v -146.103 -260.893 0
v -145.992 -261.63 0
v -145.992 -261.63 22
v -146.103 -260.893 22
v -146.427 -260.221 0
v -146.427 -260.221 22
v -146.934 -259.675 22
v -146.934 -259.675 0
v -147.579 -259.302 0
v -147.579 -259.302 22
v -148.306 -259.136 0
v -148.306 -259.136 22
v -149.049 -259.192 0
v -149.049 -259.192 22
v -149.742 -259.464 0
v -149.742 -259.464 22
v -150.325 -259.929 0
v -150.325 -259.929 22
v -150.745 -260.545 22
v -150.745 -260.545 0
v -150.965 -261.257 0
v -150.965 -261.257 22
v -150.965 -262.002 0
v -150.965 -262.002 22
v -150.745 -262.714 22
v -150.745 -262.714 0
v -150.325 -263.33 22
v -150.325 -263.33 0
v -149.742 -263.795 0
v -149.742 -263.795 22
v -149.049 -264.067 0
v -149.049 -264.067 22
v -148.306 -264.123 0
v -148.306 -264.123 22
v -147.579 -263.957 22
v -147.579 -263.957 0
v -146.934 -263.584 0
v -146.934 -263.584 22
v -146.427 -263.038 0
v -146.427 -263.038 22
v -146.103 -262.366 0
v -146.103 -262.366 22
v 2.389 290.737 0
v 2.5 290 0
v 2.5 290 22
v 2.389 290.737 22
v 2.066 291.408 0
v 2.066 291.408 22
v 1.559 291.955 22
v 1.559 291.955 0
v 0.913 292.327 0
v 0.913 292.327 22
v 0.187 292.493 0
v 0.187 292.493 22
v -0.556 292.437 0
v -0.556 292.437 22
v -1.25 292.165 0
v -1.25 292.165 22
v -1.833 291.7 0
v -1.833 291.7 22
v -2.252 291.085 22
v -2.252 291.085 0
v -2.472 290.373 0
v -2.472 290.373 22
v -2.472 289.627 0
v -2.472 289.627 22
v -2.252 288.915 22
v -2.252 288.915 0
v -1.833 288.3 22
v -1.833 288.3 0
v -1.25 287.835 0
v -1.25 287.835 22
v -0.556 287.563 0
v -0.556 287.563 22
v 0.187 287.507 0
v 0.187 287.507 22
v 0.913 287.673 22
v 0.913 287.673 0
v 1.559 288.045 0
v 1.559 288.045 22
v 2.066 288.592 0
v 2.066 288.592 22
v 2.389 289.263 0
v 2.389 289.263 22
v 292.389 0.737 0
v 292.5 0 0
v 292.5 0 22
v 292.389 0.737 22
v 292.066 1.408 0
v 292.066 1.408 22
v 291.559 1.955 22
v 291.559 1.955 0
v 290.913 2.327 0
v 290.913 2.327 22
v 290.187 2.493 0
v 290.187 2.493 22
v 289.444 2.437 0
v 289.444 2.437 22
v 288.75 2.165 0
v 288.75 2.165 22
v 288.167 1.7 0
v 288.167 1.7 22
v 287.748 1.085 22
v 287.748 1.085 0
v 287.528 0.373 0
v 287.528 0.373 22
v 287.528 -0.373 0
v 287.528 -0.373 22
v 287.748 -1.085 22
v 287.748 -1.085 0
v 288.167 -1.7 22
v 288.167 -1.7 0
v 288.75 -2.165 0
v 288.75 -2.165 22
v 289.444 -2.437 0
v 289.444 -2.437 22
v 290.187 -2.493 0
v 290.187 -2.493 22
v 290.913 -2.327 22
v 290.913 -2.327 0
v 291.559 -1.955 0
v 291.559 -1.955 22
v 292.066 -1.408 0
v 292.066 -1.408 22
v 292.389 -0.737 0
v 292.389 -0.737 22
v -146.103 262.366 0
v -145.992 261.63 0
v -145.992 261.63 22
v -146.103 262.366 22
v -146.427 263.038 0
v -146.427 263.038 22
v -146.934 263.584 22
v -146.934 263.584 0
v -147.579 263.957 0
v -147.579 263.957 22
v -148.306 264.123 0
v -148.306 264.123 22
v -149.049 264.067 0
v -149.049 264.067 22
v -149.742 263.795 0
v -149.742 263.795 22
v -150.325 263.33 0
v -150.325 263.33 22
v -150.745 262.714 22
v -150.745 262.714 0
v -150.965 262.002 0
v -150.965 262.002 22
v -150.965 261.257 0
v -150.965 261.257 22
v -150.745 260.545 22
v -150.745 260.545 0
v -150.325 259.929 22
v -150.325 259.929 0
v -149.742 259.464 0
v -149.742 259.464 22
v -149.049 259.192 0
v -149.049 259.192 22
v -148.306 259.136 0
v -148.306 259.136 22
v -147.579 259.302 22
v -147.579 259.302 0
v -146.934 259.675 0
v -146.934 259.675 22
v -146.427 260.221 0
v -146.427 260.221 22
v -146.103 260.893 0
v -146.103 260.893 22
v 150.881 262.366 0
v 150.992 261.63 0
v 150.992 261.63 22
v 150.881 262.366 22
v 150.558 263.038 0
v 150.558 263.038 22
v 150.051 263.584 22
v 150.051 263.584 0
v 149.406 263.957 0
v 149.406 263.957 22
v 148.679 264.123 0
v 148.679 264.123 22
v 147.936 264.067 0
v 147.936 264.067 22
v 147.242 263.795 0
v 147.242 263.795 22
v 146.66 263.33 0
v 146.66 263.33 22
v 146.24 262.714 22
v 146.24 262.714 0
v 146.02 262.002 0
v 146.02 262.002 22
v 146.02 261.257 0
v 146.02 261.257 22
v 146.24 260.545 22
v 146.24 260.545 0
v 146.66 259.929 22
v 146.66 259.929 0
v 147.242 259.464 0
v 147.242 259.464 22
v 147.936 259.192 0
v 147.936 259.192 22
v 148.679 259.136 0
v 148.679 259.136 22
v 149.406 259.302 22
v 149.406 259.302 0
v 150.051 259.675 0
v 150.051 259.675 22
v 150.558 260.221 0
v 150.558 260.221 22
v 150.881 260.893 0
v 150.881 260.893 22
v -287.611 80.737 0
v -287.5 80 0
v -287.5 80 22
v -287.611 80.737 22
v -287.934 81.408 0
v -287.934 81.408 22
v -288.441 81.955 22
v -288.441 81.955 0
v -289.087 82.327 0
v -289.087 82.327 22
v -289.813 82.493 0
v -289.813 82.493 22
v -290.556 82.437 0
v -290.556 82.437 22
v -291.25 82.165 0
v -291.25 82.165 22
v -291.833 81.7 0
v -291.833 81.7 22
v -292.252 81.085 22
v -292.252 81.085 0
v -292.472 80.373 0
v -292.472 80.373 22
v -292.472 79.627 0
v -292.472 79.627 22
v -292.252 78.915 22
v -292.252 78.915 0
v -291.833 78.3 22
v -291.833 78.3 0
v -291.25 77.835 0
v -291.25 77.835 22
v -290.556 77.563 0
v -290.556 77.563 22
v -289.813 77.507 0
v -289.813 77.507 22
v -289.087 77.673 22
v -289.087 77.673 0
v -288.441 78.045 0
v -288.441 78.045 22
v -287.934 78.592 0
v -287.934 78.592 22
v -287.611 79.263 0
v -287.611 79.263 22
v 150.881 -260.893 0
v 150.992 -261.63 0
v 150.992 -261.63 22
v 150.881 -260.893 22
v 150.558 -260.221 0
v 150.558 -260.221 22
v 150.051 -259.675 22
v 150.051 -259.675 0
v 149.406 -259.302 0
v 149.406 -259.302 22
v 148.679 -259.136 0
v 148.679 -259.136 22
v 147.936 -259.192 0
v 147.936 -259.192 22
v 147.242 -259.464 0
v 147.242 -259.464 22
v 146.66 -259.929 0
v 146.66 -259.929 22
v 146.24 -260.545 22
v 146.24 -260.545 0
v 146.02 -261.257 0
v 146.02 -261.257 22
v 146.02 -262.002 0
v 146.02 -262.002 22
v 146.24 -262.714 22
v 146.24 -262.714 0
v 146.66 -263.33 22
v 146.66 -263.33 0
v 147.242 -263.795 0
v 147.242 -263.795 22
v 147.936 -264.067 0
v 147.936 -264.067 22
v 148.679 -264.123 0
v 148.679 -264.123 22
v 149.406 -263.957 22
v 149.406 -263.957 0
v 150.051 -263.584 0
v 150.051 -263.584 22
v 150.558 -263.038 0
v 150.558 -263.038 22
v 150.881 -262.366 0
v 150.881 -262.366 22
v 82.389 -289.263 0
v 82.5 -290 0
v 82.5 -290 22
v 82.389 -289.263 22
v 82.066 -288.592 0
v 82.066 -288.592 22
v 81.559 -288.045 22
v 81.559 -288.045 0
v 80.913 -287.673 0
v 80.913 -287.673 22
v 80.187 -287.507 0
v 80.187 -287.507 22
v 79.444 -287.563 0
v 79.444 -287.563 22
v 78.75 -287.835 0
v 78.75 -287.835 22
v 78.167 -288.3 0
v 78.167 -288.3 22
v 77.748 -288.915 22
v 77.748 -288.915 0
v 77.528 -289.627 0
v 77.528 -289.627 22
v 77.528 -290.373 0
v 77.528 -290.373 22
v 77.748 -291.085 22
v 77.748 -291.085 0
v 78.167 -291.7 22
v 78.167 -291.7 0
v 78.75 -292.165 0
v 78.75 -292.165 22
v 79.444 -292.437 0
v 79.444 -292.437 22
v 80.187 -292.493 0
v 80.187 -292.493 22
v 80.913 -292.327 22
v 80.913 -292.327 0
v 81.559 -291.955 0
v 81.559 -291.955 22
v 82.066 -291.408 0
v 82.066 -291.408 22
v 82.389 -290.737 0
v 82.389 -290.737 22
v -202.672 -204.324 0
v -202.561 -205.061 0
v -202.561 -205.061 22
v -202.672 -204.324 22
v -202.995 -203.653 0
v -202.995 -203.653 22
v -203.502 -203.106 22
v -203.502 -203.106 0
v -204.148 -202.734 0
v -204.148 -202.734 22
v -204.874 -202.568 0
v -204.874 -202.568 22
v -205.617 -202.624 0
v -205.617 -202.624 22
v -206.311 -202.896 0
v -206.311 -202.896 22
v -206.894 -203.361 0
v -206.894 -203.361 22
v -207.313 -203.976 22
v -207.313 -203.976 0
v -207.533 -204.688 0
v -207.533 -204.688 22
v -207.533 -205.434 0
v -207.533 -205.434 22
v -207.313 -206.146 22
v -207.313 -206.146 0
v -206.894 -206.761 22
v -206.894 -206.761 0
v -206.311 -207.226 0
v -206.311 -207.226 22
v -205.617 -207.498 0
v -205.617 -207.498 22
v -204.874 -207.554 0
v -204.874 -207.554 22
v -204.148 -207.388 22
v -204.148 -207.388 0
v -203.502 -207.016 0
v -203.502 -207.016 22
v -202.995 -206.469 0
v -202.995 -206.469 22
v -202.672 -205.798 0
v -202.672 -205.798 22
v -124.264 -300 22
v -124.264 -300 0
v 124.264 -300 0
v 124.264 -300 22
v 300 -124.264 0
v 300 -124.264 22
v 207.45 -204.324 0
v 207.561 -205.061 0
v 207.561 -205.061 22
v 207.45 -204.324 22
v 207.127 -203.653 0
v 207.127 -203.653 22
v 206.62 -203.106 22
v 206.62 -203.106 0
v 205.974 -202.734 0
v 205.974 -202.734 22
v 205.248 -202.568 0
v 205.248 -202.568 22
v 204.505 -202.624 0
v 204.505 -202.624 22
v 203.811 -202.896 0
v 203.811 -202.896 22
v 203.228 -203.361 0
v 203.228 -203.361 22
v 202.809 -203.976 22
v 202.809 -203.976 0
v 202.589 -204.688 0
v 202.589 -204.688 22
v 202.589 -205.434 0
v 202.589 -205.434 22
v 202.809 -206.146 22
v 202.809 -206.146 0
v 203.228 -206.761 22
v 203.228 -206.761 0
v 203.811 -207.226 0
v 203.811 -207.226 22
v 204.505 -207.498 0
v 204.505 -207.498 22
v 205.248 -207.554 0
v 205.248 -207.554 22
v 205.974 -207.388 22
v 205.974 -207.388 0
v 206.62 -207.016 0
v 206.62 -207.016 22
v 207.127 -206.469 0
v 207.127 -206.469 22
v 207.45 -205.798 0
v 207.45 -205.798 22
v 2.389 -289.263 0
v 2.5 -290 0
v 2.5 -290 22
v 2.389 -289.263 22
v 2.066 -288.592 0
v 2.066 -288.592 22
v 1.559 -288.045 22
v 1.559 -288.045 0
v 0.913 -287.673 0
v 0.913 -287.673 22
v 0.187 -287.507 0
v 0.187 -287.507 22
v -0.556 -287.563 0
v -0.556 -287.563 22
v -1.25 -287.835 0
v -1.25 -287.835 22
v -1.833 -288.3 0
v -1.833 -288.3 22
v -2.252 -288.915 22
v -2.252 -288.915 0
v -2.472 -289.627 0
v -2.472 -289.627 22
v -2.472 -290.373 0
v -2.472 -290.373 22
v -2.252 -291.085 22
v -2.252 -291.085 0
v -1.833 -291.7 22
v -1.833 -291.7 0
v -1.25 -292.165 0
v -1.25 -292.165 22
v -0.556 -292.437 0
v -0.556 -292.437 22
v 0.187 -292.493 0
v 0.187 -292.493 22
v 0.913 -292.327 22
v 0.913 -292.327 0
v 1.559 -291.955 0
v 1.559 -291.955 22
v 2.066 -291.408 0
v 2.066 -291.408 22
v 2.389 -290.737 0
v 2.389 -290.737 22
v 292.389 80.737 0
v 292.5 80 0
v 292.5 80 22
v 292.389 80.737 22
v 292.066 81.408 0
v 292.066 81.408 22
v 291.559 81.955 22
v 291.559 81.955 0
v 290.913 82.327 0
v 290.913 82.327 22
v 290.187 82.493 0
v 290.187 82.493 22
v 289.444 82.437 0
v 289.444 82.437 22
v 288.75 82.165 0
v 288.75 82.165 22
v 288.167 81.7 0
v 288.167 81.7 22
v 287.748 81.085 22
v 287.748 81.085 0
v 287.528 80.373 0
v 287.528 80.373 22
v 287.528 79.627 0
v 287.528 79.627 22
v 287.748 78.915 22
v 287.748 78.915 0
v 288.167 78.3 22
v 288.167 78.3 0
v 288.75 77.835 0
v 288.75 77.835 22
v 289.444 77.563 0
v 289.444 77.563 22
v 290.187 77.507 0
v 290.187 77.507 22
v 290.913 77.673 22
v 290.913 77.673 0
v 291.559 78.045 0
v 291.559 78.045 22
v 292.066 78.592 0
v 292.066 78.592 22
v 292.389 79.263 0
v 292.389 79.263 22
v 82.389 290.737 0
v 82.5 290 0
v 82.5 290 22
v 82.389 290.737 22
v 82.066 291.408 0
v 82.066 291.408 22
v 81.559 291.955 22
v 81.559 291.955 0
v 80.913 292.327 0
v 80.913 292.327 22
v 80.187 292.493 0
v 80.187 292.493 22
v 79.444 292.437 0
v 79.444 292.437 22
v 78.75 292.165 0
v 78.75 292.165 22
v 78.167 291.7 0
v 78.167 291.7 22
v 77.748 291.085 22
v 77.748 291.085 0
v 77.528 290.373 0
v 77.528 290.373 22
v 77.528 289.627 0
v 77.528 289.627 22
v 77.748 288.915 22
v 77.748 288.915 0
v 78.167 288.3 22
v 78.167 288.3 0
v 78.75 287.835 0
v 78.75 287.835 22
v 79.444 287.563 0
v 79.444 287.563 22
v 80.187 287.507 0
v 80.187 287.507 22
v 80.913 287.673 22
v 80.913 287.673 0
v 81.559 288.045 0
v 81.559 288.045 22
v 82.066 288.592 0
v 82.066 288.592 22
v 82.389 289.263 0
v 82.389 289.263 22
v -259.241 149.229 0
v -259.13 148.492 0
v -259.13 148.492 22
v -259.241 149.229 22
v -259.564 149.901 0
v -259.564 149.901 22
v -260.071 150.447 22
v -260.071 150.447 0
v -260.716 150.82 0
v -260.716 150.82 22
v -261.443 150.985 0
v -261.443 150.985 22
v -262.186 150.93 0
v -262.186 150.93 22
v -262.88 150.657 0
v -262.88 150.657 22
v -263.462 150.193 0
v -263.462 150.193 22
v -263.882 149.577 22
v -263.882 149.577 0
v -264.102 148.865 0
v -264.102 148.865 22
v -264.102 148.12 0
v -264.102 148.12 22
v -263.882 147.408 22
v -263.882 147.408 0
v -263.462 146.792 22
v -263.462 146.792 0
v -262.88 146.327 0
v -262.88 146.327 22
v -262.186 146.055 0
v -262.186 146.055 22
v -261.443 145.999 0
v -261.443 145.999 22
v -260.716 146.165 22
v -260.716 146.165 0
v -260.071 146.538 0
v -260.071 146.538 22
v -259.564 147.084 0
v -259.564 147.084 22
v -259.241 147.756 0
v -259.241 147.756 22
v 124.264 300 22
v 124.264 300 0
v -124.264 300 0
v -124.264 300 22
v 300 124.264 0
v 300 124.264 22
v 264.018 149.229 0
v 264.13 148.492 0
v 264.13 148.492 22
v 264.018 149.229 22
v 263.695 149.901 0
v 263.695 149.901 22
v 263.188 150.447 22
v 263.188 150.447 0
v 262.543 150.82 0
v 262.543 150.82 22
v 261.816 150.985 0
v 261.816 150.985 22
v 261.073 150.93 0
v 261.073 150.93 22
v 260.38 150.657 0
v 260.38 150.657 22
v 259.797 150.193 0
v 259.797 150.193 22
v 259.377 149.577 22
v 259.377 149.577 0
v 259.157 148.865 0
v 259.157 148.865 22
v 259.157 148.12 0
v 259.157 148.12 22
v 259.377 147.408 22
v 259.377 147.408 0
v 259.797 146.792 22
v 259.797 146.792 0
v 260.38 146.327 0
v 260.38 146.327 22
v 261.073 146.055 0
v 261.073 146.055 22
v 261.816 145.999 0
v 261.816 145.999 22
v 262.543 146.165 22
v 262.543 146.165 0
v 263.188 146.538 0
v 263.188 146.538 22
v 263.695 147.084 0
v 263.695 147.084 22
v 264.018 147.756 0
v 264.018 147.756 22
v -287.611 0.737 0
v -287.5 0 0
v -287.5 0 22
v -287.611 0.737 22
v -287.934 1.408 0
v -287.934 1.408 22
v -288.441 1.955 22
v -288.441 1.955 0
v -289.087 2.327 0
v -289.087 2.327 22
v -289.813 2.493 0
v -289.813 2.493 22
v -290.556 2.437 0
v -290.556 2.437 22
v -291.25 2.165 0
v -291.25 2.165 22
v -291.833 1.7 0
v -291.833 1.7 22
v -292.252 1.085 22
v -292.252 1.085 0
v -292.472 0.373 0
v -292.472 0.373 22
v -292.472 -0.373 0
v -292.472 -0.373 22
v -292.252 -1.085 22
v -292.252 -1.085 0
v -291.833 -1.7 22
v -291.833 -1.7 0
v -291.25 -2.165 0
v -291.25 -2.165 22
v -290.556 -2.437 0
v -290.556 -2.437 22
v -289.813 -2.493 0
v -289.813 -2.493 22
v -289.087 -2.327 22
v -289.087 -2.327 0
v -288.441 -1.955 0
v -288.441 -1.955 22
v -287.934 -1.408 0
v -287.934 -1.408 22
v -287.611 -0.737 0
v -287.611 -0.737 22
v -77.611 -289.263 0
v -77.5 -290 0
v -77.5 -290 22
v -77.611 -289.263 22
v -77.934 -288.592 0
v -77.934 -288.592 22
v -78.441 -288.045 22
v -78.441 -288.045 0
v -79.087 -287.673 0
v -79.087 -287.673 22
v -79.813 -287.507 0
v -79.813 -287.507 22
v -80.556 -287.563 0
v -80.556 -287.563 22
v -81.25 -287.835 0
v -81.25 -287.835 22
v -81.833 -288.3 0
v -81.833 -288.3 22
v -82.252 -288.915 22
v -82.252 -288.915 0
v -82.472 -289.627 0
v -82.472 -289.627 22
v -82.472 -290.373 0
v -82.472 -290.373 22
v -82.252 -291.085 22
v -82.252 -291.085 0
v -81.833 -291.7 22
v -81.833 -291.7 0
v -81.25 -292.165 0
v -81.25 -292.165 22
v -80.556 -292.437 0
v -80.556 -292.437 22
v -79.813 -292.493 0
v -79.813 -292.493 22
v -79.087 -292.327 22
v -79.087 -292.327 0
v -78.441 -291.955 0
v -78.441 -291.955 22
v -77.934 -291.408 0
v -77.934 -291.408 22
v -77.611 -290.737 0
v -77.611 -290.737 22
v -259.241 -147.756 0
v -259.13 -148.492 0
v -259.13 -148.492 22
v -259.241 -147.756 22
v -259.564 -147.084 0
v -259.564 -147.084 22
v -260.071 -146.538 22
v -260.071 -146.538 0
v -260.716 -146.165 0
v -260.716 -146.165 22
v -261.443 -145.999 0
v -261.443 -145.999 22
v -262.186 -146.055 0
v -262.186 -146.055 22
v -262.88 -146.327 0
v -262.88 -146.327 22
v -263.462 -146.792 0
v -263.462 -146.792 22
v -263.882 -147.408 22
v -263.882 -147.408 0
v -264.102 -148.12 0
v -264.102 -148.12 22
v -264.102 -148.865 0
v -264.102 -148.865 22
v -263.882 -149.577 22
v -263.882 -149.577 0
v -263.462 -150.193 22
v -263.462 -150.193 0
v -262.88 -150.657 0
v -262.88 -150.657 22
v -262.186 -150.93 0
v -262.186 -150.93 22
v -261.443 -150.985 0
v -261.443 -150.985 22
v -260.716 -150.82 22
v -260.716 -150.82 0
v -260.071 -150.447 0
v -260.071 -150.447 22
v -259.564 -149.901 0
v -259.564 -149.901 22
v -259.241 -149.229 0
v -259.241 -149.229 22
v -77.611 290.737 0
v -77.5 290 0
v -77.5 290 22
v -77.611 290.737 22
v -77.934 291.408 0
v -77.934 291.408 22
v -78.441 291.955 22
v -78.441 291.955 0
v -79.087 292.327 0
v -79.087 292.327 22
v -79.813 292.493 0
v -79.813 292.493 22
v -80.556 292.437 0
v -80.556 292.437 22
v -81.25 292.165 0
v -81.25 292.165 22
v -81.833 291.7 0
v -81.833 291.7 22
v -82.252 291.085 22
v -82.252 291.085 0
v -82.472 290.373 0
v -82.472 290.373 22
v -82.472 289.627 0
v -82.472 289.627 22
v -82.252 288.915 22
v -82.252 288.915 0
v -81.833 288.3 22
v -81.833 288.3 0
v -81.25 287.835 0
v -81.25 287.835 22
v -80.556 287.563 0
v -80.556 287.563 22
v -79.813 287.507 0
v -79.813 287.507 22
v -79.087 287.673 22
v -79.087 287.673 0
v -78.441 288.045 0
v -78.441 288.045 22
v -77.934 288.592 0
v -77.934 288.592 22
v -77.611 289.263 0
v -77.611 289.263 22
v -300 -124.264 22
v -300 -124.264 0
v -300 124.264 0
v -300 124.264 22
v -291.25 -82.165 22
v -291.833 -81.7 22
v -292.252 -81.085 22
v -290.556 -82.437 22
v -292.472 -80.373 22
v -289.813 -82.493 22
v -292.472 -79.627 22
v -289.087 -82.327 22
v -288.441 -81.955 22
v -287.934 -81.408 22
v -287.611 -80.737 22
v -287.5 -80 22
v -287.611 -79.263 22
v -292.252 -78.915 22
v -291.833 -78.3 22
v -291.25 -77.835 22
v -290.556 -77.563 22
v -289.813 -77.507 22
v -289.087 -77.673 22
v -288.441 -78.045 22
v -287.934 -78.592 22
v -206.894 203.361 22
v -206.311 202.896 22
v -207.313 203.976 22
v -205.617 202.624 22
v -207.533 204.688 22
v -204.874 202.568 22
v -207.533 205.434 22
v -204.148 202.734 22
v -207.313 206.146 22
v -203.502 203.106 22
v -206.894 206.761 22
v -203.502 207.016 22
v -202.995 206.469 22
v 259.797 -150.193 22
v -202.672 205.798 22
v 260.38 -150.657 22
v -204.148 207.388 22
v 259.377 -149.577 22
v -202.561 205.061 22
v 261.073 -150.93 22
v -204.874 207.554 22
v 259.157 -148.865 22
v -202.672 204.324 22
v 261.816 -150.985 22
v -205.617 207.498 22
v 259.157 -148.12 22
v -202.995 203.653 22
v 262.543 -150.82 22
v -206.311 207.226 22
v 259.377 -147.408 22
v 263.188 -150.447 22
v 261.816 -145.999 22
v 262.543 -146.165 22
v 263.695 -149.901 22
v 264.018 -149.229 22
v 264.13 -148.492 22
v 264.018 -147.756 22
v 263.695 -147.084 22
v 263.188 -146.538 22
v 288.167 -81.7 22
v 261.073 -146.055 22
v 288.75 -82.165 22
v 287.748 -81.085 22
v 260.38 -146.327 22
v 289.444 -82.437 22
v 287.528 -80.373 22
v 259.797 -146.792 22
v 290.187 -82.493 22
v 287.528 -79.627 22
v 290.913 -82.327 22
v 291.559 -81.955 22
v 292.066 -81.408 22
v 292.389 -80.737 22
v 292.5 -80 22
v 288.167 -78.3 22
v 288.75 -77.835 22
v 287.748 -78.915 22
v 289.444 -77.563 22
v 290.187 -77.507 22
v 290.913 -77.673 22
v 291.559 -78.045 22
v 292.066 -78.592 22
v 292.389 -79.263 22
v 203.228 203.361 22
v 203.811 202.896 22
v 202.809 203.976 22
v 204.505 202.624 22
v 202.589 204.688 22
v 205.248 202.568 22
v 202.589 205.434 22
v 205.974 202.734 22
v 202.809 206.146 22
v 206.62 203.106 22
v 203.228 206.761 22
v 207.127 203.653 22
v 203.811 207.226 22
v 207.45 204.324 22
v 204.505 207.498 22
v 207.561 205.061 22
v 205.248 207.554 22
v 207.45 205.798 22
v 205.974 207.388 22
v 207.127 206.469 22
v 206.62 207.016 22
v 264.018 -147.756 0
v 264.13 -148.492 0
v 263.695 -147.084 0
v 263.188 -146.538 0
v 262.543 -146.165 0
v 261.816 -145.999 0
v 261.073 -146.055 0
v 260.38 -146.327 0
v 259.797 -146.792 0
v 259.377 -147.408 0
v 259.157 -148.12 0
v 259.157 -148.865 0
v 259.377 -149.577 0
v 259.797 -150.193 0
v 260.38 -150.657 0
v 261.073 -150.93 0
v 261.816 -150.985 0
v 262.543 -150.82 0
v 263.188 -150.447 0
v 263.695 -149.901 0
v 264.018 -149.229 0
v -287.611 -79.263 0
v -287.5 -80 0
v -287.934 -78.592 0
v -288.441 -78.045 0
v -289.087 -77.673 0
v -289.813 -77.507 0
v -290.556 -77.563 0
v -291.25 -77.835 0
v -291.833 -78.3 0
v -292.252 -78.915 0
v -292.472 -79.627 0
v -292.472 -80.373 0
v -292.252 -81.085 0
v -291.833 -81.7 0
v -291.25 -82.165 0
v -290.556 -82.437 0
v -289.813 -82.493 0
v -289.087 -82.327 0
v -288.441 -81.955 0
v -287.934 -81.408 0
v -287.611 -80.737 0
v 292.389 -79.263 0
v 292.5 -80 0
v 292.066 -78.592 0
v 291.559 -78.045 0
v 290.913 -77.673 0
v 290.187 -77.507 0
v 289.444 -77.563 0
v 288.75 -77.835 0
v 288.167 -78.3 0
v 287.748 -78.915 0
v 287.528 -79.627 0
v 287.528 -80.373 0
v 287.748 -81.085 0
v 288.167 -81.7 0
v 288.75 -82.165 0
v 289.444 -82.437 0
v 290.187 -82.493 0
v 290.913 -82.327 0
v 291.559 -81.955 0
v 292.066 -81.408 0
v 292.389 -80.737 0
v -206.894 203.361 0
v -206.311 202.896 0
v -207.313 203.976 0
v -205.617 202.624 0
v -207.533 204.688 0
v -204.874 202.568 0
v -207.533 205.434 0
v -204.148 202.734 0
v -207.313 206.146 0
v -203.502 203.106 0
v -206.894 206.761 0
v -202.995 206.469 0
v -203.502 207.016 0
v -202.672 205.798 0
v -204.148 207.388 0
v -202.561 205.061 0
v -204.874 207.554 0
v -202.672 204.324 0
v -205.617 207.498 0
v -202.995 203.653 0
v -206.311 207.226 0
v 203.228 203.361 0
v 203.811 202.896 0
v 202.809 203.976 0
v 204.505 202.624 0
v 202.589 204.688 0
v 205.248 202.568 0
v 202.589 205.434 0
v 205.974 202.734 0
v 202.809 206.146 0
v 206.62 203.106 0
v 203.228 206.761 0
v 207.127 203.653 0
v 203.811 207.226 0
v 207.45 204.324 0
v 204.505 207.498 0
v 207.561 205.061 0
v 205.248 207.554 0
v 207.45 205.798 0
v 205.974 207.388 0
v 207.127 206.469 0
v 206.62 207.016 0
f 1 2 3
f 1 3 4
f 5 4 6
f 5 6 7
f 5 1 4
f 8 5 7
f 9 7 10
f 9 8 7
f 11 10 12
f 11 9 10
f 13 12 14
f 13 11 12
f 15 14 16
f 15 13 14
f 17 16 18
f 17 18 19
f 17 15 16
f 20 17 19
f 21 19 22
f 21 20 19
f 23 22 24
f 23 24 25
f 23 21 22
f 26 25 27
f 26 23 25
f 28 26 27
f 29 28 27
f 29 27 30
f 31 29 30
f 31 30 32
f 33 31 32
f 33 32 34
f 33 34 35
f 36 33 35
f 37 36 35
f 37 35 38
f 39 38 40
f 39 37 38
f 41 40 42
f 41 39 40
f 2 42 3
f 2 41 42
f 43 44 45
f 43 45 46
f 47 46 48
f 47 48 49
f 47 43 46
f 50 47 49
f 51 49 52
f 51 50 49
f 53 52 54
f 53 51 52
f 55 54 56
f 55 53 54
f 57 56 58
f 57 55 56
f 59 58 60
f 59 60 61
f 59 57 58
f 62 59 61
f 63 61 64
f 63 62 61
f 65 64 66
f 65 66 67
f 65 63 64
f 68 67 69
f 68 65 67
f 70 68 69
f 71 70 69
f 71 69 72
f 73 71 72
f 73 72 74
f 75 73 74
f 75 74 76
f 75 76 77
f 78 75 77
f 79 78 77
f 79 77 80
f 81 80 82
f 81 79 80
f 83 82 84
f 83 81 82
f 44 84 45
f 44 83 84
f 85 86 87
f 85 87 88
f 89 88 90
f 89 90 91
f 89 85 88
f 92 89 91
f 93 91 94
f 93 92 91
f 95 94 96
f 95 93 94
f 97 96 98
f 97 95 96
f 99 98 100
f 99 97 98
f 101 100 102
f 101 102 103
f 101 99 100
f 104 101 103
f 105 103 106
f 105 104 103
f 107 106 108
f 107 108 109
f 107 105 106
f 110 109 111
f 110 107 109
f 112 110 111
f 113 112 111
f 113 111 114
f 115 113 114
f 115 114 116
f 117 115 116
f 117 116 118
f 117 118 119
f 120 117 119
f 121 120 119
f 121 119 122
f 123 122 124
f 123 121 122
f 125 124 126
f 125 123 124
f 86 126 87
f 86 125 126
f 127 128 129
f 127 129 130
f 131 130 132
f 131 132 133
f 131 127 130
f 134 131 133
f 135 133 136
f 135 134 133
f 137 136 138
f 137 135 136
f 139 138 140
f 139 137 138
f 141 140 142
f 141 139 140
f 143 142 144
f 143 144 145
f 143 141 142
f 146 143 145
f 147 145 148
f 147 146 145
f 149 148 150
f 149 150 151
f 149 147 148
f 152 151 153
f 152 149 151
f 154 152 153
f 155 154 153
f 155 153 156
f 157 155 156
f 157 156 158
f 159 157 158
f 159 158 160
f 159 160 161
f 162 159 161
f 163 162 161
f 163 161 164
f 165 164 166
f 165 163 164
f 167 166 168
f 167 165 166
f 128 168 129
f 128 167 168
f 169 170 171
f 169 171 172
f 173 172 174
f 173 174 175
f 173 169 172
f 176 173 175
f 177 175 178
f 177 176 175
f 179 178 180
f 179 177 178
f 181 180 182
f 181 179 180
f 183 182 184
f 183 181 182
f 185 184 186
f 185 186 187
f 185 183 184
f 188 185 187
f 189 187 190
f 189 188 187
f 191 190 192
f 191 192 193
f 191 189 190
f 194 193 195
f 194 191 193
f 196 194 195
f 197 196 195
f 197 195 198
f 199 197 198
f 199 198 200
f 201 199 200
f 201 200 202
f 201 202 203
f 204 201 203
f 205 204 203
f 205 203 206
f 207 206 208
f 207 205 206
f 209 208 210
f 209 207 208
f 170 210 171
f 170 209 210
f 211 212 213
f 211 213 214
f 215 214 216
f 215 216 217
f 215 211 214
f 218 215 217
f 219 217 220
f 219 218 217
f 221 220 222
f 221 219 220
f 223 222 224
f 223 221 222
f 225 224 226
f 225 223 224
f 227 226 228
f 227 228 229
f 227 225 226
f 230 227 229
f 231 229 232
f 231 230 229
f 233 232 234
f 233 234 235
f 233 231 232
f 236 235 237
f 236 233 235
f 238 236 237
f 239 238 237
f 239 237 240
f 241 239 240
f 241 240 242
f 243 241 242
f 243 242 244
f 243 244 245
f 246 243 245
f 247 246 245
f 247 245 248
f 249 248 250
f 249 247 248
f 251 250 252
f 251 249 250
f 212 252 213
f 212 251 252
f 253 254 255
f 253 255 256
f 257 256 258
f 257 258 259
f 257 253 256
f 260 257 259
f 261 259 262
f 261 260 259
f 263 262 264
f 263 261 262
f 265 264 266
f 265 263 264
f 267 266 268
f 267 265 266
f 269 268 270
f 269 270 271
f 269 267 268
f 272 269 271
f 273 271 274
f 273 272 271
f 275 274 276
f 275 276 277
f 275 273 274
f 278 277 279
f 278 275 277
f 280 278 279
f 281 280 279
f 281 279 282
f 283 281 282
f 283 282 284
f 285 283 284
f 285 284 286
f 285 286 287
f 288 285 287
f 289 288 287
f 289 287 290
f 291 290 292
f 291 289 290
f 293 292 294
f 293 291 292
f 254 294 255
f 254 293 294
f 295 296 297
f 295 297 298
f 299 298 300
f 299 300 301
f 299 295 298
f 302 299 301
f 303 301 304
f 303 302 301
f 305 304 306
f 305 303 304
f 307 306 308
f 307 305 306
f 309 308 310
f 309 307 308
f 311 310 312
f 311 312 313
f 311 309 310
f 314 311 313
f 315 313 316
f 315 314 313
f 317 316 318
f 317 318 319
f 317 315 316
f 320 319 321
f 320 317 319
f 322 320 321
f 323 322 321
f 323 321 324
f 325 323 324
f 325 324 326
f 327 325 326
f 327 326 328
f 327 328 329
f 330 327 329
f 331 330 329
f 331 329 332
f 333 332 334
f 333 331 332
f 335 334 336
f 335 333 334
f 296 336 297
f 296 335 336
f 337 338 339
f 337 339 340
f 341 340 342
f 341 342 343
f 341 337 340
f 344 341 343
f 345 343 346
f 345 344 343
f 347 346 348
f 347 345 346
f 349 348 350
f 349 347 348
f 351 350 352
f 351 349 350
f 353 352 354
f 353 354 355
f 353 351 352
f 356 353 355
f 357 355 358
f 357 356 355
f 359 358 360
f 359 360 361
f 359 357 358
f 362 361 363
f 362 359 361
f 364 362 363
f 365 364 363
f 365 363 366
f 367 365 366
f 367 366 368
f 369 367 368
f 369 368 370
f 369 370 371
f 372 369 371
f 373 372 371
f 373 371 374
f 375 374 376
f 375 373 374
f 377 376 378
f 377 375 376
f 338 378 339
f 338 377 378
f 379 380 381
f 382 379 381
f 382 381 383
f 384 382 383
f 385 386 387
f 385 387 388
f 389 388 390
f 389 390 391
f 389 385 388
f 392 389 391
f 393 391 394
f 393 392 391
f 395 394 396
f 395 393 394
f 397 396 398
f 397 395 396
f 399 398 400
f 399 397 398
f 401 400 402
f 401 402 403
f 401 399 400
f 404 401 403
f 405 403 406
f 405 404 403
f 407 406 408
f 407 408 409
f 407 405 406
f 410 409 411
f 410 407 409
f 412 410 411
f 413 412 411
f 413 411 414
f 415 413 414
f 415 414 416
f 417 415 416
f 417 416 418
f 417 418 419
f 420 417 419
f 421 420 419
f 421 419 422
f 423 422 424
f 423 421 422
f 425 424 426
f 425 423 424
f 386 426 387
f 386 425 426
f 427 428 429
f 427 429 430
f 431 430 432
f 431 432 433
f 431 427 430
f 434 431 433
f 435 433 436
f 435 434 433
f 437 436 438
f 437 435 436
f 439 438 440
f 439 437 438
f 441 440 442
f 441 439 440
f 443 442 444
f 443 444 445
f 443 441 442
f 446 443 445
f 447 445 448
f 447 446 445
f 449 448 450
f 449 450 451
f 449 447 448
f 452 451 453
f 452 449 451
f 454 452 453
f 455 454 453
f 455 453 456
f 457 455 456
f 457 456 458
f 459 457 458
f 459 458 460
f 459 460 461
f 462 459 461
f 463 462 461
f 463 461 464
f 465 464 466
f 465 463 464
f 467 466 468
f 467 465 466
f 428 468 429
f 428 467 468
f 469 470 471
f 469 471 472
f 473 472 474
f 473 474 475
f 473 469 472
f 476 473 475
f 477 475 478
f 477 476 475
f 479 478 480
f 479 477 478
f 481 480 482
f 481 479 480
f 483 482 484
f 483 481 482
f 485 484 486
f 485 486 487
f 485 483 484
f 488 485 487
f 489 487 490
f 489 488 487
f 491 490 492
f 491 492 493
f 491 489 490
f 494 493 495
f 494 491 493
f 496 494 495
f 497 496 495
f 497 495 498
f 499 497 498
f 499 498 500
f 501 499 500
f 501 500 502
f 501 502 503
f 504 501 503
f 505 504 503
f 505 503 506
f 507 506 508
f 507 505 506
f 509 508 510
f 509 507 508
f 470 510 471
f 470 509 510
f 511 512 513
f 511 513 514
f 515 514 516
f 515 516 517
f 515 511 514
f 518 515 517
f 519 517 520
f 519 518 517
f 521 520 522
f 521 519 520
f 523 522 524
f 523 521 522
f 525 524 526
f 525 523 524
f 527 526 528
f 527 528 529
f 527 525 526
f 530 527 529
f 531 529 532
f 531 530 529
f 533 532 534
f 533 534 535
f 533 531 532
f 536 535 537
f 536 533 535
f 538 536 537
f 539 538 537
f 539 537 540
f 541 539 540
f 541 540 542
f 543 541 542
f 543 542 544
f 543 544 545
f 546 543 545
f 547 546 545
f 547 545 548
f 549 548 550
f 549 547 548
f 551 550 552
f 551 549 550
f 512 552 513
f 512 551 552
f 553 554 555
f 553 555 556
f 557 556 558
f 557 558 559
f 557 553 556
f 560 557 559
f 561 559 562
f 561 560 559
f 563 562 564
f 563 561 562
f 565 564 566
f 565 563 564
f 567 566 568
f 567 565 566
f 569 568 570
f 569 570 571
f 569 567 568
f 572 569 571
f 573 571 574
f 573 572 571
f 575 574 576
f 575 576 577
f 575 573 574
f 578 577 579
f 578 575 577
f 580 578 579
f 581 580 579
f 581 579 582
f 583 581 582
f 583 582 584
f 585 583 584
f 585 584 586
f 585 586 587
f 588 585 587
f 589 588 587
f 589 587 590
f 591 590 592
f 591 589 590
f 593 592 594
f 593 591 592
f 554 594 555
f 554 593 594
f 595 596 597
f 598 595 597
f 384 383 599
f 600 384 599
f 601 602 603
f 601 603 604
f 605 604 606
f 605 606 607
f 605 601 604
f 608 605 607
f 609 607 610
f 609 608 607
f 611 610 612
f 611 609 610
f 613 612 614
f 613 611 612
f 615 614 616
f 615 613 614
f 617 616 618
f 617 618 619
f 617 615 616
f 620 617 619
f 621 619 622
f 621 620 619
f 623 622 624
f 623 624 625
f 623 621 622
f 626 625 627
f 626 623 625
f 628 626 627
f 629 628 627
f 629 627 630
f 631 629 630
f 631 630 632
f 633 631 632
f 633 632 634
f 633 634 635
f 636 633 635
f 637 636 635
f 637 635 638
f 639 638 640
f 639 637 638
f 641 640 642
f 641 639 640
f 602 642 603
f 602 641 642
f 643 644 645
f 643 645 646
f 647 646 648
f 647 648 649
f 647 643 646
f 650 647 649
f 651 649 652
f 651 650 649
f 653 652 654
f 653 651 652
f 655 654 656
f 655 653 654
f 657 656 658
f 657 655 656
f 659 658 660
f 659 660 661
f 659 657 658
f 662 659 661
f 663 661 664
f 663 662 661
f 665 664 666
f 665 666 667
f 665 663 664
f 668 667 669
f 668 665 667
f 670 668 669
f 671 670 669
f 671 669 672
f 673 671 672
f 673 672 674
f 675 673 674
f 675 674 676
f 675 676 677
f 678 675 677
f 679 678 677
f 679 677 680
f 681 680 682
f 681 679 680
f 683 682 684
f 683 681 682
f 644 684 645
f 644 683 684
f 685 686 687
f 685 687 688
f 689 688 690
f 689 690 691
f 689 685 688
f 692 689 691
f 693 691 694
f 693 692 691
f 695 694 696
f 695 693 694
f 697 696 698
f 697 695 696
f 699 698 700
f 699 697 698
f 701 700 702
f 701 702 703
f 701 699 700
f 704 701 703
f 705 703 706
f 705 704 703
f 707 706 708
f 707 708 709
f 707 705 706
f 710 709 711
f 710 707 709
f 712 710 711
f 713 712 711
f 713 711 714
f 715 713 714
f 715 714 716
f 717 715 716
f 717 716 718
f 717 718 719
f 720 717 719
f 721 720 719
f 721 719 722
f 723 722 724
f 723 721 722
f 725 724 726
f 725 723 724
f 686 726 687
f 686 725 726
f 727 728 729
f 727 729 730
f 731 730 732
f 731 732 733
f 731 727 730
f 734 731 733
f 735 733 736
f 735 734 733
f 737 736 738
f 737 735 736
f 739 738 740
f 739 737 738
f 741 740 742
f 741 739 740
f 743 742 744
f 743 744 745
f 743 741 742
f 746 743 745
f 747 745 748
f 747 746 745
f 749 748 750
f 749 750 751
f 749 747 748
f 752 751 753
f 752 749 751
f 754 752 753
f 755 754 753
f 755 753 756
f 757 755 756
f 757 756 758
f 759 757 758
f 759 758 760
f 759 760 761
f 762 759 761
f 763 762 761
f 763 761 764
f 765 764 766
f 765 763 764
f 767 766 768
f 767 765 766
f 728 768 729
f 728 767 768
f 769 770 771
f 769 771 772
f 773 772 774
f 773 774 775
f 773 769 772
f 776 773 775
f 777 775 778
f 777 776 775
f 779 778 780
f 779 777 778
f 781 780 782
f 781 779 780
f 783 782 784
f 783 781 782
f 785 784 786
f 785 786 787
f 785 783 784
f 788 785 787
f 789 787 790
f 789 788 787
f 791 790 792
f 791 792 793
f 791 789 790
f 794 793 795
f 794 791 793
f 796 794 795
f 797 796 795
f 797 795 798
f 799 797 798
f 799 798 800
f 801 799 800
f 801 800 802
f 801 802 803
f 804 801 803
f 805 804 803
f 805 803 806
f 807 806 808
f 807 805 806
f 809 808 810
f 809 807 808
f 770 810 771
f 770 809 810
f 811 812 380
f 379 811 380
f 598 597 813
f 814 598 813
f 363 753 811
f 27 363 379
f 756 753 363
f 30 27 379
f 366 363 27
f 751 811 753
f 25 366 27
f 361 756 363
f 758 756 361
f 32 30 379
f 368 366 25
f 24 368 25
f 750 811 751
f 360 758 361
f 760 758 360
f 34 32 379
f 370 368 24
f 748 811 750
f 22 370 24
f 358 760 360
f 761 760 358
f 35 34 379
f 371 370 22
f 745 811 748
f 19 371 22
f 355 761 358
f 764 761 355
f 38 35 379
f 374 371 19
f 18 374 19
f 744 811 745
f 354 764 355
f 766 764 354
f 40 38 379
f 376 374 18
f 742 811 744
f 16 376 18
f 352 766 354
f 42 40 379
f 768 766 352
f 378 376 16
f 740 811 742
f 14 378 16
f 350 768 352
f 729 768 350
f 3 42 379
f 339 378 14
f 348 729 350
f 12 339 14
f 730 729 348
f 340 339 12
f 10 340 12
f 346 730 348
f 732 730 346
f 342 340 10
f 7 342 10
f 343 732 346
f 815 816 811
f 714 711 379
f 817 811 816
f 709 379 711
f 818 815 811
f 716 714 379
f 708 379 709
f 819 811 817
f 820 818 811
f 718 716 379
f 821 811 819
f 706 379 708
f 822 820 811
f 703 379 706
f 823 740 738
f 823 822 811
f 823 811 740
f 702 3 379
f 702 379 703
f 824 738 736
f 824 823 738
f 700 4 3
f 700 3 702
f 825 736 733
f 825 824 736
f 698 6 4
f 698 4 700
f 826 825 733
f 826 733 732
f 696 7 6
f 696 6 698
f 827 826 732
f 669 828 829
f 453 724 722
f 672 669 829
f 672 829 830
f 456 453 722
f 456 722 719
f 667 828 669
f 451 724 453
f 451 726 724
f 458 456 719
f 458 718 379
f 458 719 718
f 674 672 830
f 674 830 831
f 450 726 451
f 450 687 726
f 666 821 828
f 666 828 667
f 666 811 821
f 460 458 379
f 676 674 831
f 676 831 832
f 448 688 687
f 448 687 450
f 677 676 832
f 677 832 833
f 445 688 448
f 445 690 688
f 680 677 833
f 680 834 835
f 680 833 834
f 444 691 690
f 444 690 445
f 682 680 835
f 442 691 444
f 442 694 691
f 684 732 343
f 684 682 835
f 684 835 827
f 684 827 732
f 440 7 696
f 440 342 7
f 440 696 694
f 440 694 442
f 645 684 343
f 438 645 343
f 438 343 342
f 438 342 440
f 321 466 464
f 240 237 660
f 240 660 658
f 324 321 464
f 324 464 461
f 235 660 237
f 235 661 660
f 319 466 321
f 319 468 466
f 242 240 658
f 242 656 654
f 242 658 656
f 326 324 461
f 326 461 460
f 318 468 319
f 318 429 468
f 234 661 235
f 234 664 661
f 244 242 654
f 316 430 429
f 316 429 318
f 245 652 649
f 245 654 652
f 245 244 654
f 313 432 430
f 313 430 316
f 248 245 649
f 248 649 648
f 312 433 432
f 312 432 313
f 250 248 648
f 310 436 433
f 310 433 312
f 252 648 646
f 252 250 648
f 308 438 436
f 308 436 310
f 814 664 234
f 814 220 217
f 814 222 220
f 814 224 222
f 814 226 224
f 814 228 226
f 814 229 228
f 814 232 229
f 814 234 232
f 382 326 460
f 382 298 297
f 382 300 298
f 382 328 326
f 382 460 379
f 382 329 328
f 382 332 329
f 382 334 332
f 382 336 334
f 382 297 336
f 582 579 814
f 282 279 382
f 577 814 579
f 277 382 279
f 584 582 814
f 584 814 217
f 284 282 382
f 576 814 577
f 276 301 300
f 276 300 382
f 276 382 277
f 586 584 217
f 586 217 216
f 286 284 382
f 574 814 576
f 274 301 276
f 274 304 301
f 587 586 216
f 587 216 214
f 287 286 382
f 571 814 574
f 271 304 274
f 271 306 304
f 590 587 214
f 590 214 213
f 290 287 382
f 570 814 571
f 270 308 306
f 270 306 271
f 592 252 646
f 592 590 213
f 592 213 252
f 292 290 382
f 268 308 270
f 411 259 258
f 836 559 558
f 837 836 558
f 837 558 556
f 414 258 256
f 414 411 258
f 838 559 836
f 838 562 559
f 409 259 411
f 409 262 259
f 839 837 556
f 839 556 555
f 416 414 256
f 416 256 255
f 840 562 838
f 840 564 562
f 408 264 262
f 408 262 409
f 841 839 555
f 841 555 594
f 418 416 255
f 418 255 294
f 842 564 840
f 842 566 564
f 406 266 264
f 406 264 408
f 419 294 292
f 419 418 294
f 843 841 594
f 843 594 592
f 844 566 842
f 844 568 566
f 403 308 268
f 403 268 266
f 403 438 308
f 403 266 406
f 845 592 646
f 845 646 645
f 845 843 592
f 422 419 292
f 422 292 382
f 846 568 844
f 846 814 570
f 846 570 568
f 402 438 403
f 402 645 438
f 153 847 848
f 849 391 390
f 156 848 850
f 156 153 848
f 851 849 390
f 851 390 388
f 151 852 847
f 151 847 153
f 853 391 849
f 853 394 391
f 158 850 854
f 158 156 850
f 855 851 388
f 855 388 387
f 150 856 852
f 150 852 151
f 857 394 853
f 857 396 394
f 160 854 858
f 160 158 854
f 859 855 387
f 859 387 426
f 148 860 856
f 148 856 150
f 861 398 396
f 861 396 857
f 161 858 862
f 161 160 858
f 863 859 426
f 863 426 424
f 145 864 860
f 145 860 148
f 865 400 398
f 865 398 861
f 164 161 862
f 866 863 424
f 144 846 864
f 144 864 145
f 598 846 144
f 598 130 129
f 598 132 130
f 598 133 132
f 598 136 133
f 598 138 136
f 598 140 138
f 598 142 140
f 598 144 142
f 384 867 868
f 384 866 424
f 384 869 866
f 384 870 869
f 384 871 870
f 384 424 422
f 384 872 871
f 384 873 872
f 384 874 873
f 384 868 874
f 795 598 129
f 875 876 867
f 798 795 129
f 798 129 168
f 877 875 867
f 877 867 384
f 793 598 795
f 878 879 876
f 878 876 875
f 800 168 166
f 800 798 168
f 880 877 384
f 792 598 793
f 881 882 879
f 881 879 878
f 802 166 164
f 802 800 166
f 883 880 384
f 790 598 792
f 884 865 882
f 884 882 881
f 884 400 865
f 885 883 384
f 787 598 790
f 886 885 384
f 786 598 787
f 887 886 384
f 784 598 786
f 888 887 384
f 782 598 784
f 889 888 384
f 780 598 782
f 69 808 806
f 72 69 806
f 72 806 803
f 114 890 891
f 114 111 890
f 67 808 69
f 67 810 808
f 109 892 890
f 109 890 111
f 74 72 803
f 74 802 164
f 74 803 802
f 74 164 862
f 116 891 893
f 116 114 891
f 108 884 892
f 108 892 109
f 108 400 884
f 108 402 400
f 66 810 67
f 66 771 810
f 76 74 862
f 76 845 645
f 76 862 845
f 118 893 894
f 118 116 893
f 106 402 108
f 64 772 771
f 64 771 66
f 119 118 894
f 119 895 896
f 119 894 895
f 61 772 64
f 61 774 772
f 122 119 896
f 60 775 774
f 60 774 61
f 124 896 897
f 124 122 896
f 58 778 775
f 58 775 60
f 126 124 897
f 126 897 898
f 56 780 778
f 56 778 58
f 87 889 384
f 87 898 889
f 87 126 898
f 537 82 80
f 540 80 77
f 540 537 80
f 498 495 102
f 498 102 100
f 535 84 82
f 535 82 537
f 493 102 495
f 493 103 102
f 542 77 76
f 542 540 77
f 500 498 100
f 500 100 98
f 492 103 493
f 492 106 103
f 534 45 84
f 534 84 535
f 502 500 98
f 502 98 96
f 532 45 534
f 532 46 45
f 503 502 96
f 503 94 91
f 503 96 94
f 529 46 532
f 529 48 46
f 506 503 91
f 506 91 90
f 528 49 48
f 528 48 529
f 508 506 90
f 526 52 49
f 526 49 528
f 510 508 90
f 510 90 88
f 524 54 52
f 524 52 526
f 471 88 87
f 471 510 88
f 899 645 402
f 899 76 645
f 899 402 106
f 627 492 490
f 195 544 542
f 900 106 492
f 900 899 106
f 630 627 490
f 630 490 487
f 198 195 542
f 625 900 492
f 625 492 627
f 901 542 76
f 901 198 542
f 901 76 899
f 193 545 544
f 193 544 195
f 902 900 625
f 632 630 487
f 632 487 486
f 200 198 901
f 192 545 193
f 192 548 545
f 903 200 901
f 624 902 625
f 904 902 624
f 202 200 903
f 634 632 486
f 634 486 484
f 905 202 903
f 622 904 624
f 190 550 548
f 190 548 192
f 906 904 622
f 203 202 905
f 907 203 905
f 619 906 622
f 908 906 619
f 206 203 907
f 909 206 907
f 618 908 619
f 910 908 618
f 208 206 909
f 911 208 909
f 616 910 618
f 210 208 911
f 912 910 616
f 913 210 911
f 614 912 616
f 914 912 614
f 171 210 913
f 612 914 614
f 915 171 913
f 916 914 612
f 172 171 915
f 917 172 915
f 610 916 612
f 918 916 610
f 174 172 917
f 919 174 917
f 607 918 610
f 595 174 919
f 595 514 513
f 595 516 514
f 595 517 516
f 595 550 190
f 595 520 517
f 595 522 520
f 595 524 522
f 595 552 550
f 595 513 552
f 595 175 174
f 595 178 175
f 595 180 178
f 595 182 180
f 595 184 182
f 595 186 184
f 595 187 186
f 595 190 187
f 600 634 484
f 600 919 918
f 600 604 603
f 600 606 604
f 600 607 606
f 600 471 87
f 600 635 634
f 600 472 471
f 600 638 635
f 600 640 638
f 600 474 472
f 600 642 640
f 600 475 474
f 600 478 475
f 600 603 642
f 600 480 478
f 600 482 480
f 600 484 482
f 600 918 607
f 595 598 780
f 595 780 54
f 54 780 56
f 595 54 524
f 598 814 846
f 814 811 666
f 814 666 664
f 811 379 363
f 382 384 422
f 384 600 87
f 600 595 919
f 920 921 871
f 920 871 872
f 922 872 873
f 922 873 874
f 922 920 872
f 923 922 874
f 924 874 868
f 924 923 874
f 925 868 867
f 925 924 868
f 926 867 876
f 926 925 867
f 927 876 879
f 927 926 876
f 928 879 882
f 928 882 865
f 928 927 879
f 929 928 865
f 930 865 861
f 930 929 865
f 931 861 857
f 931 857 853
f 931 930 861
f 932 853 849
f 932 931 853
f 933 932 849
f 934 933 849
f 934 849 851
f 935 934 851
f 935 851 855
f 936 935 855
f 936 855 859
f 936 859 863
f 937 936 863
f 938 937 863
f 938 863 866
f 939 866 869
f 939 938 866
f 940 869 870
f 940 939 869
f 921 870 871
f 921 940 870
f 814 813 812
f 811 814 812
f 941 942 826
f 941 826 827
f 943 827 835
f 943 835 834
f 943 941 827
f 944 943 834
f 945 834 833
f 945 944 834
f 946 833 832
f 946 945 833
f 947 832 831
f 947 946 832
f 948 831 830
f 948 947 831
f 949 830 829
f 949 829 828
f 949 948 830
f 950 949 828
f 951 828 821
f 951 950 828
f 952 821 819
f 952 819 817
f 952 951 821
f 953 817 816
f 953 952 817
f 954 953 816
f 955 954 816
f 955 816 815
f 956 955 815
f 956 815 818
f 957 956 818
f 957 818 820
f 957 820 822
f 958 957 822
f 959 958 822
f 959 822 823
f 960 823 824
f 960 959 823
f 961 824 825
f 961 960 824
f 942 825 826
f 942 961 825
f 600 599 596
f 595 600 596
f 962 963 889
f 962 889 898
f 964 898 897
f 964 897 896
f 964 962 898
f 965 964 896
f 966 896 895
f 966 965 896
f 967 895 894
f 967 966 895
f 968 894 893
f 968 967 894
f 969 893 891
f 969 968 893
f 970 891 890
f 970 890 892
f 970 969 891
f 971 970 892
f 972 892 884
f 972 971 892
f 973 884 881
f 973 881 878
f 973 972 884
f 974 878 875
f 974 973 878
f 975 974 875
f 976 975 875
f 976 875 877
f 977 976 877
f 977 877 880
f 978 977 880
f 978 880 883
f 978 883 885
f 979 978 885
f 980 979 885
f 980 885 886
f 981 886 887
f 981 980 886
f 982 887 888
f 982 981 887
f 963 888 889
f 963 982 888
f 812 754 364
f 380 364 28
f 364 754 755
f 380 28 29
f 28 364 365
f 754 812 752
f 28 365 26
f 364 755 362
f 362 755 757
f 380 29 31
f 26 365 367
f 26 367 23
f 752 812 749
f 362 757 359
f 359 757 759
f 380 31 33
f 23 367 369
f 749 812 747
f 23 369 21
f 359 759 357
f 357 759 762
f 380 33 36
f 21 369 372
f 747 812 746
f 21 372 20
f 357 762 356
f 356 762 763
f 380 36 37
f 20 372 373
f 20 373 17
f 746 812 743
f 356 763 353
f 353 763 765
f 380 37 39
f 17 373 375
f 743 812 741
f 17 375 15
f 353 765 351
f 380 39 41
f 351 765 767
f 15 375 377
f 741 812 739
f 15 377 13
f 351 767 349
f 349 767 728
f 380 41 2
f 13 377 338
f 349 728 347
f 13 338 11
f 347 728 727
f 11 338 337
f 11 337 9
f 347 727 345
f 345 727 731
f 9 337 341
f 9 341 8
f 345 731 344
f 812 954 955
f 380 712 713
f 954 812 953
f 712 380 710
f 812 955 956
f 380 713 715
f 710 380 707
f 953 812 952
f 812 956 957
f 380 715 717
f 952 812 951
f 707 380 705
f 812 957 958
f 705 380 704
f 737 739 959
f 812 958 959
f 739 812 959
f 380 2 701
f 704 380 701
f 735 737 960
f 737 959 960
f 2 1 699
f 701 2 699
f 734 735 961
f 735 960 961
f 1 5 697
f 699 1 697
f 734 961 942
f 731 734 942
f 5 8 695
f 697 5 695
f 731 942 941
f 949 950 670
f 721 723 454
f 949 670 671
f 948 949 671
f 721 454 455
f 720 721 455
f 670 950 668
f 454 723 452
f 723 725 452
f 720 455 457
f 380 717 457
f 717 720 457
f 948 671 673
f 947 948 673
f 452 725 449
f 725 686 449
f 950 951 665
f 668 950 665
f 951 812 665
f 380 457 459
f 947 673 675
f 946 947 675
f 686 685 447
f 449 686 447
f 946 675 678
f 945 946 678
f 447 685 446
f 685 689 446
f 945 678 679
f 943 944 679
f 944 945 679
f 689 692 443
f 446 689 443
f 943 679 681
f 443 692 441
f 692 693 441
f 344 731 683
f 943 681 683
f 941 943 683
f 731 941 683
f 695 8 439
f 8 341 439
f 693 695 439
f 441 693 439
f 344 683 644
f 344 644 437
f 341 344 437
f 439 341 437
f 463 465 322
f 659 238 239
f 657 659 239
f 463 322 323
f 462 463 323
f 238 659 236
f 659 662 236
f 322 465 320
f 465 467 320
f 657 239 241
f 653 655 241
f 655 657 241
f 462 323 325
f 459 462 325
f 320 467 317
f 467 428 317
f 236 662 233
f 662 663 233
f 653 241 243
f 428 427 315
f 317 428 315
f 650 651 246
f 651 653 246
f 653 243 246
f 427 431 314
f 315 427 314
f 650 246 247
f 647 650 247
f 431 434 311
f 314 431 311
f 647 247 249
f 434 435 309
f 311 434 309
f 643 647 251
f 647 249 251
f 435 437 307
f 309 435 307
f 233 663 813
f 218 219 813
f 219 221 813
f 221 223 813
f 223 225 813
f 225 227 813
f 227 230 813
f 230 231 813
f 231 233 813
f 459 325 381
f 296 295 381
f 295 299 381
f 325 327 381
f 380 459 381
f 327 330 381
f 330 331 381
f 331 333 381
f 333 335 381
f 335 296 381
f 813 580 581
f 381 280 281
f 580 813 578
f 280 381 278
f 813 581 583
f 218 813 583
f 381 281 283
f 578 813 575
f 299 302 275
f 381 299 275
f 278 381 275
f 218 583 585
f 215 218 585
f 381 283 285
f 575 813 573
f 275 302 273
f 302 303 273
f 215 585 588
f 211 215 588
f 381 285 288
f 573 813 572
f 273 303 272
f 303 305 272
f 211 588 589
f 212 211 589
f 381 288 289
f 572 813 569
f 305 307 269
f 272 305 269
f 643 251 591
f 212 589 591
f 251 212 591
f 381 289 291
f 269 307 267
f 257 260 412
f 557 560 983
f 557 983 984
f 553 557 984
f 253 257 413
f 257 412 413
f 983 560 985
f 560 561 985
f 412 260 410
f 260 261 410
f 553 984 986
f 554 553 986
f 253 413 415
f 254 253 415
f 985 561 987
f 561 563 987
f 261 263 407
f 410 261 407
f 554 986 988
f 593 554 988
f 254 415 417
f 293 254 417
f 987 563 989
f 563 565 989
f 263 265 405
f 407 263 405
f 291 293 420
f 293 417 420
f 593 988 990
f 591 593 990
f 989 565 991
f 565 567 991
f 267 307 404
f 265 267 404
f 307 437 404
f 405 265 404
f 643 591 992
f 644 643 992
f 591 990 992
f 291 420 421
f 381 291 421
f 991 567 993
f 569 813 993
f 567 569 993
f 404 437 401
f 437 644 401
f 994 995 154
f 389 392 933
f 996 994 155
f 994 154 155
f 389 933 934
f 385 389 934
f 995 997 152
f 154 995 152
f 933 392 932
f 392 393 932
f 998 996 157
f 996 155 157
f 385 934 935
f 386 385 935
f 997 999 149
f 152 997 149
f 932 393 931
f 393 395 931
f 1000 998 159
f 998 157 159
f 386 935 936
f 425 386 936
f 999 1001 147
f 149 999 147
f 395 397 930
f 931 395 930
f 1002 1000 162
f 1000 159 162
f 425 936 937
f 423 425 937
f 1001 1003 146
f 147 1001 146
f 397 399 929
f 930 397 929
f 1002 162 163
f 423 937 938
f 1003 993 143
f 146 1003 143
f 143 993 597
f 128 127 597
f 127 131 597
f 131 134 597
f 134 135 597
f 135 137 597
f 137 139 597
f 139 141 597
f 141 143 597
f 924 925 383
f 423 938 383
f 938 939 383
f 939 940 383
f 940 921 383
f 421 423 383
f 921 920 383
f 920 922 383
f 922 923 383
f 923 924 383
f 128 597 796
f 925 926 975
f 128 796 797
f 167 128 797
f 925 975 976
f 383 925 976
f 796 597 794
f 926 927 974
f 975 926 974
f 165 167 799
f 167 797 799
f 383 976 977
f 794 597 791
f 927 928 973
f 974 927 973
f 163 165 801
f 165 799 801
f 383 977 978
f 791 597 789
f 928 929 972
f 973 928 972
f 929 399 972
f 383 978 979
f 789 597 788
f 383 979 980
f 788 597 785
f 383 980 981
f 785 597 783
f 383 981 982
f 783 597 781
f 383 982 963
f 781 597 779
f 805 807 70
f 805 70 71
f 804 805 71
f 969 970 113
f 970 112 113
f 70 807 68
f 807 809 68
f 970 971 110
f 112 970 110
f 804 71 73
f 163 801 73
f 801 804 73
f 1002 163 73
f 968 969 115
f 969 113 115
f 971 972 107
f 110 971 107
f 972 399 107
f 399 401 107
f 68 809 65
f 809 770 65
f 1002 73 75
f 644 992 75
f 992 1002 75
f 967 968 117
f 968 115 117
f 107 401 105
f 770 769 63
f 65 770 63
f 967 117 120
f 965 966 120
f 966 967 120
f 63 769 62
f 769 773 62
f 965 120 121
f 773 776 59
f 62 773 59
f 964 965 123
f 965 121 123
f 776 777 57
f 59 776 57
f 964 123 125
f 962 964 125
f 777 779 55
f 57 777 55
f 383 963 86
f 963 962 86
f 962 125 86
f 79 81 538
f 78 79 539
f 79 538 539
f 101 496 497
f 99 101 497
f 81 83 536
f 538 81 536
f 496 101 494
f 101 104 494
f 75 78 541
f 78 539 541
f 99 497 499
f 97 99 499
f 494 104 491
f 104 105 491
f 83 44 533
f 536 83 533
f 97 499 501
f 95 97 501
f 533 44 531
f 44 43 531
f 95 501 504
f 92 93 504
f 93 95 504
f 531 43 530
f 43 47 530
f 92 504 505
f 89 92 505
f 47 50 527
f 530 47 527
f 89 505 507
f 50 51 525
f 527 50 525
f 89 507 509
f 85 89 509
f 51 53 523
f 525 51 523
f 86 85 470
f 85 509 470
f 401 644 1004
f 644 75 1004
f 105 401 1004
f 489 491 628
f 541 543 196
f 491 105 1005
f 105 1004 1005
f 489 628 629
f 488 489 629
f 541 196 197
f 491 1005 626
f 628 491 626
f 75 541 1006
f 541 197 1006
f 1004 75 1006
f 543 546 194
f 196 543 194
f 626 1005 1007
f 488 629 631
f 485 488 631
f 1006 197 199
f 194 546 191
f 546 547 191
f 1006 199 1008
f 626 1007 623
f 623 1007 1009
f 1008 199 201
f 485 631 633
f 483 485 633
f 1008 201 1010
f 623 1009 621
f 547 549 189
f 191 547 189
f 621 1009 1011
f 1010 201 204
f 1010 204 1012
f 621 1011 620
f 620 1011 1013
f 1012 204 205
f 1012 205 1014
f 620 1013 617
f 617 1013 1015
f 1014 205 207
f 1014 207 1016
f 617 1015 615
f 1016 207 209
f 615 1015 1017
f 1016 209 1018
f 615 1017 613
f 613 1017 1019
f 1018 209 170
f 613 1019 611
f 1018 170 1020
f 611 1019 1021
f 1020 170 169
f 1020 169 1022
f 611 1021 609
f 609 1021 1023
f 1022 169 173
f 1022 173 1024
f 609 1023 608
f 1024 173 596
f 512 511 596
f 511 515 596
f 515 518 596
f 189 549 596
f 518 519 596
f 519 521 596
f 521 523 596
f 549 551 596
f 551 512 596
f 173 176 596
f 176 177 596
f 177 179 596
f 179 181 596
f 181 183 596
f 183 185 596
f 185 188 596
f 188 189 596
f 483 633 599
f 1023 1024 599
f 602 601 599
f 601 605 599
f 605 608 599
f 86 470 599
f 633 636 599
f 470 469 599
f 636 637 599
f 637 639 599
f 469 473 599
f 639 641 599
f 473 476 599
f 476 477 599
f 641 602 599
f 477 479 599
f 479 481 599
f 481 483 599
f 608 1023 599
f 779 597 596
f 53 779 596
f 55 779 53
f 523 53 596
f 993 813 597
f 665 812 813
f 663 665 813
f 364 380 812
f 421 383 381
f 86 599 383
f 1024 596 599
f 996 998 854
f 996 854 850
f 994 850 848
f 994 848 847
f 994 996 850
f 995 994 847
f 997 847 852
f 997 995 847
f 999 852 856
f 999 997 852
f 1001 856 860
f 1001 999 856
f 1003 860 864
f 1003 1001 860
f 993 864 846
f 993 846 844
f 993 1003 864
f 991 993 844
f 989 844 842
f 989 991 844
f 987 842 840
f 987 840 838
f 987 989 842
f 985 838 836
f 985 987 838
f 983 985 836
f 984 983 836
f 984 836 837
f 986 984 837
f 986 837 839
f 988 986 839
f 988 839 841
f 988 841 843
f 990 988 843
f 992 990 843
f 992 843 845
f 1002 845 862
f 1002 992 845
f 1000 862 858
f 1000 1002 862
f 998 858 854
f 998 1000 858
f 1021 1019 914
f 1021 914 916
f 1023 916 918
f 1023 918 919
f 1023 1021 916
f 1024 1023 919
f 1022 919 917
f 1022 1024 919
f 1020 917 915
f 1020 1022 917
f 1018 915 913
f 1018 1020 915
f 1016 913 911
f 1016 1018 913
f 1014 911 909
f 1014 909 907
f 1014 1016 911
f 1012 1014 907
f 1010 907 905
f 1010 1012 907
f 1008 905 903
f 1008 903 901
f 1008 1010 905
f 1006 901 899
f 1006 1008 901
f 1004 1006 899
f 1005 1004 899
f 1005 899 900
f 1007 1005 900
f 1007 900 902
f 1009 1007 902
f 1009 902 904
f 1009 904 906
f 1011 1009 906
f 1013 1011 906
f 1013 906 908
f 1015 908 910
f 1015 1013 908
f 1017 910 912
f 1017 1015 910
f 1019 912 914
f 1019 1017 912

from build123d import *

# Parameters (mm, degrees)
SKETCH_1_R      = 2.5
EXTRUDE_1_DEPTH = 22


with BuildPart() as part:
    # 스케치1 → 보스-돌출1 (new body)
    with BuildSketch(Plane.XY):
        Polygon((124.264068712, 300), (-124.264068712, 300), (-300, 124.264068712), (-300, -124.264068712), (-124.264068712, -300), (124.264068712, -300), (300, -124.264068712), (300, 124.264068712), align=None)
        with Locations((0, 290)):
            Circle(SKETCH_1_R, mode=Mode.SUBTRACT)
        with Locations((80, 290)):
            Circle(SKETCH_1_R, mode=Mode.SUBTRACT)
        with Locations((-80, 290)):
            Circle(SKETCH_1_R, mode=Mode.SUBTRACT)
        with Locations((148.492424049, 261.629509039)):
            Circle(SKETCH_1_R, mode=Mode.SUBTRACT)
        with Locations((205.060966544, 205.060966544)):
            Circle(SKETCH_1_R, mode=Mode.SUBTRACT)
        with Locations((261.629509039, 148.492424049)):
            Circle(SKETCH_1_R, mode=Mode.SUBTRACT)
        with Locations((290, 80)):
            Circle(SKETCH_1_R, mode=Mode.SUBTRACT)
        with Locations((290, 0)):
            Circle(SKETCH_1_R, mode=Mode.SUBTRACT)
        with Locations((290, -80)):
            Circle(SKETCH_1_R, mode=Mode.SUBTRACT)
        with Locations((261.629509039, -148.492424049)):
            Circle(SKETCH_1_R, mode=Mode.SUBTRACT)
        with Locations((205.060966544, -205.060966544)):
            Circle(SKETCH_1_R, mode=Mode.SUBTRACT)
        with Locations((148.492424049, -261.629509039)):
            Circle(SKETCH_1_R, mode=Mode.SUBTRACT)
        with Locations((80, -290)):
            Circle(SKETCH_1_R, mode=Mode.SUBTRACT)
        with Locations((0, -290)):
            Circle(SKETCH_1_R, mode=Mode.SUBTRACT)
        with Locations((-80, -290)):
            Circle(SKETCH_1_R, mode=Mode.SUBTRACT)
        with Locations((-148.492424049, -261.629509039)):
            Circle(SKETCH_1_R, mode=Mode.SUBTRACT)
        with Locations((-205.060966544, -205.060966544)):
            Circle(SKETCH_1_R, mode=Mode.SUBTRACT)
        with Locations((-261.629509039, -148.492424049)):
            Circle(SKETCH_1_R, mode=Mode.SUBTRACT)
        with Locations((-290, -80)):
            Circle(SKETCH_1_R, mode=Mode.SUBTRACT)
        with Locations((-290, 0)):
            Circle(SKETCH_1_R, mode=Mode.SUBTRACT)
        with Locations((-290, 80)):
            Circle(SKETCH_1_R, mode=Mode.SUBTRACT)
        with Locations((-261.629509039, 148.492424049)):
            Circle(SKETCH_1_R, mode=Mode.SUBTRACT)
        with Locations((-205.060966544, 205.060966544)):
            Circle(SKETCH_1_R, mode=Mode.SUBTRACT)
        with Locations((-148.492424049, 261.629509039)):
            Circle(SKETCH_1_R, mode=Mode.SUBTRACT)
    extrude(amount=EXTRUDE_1_DEPTH)


solid = part.part
